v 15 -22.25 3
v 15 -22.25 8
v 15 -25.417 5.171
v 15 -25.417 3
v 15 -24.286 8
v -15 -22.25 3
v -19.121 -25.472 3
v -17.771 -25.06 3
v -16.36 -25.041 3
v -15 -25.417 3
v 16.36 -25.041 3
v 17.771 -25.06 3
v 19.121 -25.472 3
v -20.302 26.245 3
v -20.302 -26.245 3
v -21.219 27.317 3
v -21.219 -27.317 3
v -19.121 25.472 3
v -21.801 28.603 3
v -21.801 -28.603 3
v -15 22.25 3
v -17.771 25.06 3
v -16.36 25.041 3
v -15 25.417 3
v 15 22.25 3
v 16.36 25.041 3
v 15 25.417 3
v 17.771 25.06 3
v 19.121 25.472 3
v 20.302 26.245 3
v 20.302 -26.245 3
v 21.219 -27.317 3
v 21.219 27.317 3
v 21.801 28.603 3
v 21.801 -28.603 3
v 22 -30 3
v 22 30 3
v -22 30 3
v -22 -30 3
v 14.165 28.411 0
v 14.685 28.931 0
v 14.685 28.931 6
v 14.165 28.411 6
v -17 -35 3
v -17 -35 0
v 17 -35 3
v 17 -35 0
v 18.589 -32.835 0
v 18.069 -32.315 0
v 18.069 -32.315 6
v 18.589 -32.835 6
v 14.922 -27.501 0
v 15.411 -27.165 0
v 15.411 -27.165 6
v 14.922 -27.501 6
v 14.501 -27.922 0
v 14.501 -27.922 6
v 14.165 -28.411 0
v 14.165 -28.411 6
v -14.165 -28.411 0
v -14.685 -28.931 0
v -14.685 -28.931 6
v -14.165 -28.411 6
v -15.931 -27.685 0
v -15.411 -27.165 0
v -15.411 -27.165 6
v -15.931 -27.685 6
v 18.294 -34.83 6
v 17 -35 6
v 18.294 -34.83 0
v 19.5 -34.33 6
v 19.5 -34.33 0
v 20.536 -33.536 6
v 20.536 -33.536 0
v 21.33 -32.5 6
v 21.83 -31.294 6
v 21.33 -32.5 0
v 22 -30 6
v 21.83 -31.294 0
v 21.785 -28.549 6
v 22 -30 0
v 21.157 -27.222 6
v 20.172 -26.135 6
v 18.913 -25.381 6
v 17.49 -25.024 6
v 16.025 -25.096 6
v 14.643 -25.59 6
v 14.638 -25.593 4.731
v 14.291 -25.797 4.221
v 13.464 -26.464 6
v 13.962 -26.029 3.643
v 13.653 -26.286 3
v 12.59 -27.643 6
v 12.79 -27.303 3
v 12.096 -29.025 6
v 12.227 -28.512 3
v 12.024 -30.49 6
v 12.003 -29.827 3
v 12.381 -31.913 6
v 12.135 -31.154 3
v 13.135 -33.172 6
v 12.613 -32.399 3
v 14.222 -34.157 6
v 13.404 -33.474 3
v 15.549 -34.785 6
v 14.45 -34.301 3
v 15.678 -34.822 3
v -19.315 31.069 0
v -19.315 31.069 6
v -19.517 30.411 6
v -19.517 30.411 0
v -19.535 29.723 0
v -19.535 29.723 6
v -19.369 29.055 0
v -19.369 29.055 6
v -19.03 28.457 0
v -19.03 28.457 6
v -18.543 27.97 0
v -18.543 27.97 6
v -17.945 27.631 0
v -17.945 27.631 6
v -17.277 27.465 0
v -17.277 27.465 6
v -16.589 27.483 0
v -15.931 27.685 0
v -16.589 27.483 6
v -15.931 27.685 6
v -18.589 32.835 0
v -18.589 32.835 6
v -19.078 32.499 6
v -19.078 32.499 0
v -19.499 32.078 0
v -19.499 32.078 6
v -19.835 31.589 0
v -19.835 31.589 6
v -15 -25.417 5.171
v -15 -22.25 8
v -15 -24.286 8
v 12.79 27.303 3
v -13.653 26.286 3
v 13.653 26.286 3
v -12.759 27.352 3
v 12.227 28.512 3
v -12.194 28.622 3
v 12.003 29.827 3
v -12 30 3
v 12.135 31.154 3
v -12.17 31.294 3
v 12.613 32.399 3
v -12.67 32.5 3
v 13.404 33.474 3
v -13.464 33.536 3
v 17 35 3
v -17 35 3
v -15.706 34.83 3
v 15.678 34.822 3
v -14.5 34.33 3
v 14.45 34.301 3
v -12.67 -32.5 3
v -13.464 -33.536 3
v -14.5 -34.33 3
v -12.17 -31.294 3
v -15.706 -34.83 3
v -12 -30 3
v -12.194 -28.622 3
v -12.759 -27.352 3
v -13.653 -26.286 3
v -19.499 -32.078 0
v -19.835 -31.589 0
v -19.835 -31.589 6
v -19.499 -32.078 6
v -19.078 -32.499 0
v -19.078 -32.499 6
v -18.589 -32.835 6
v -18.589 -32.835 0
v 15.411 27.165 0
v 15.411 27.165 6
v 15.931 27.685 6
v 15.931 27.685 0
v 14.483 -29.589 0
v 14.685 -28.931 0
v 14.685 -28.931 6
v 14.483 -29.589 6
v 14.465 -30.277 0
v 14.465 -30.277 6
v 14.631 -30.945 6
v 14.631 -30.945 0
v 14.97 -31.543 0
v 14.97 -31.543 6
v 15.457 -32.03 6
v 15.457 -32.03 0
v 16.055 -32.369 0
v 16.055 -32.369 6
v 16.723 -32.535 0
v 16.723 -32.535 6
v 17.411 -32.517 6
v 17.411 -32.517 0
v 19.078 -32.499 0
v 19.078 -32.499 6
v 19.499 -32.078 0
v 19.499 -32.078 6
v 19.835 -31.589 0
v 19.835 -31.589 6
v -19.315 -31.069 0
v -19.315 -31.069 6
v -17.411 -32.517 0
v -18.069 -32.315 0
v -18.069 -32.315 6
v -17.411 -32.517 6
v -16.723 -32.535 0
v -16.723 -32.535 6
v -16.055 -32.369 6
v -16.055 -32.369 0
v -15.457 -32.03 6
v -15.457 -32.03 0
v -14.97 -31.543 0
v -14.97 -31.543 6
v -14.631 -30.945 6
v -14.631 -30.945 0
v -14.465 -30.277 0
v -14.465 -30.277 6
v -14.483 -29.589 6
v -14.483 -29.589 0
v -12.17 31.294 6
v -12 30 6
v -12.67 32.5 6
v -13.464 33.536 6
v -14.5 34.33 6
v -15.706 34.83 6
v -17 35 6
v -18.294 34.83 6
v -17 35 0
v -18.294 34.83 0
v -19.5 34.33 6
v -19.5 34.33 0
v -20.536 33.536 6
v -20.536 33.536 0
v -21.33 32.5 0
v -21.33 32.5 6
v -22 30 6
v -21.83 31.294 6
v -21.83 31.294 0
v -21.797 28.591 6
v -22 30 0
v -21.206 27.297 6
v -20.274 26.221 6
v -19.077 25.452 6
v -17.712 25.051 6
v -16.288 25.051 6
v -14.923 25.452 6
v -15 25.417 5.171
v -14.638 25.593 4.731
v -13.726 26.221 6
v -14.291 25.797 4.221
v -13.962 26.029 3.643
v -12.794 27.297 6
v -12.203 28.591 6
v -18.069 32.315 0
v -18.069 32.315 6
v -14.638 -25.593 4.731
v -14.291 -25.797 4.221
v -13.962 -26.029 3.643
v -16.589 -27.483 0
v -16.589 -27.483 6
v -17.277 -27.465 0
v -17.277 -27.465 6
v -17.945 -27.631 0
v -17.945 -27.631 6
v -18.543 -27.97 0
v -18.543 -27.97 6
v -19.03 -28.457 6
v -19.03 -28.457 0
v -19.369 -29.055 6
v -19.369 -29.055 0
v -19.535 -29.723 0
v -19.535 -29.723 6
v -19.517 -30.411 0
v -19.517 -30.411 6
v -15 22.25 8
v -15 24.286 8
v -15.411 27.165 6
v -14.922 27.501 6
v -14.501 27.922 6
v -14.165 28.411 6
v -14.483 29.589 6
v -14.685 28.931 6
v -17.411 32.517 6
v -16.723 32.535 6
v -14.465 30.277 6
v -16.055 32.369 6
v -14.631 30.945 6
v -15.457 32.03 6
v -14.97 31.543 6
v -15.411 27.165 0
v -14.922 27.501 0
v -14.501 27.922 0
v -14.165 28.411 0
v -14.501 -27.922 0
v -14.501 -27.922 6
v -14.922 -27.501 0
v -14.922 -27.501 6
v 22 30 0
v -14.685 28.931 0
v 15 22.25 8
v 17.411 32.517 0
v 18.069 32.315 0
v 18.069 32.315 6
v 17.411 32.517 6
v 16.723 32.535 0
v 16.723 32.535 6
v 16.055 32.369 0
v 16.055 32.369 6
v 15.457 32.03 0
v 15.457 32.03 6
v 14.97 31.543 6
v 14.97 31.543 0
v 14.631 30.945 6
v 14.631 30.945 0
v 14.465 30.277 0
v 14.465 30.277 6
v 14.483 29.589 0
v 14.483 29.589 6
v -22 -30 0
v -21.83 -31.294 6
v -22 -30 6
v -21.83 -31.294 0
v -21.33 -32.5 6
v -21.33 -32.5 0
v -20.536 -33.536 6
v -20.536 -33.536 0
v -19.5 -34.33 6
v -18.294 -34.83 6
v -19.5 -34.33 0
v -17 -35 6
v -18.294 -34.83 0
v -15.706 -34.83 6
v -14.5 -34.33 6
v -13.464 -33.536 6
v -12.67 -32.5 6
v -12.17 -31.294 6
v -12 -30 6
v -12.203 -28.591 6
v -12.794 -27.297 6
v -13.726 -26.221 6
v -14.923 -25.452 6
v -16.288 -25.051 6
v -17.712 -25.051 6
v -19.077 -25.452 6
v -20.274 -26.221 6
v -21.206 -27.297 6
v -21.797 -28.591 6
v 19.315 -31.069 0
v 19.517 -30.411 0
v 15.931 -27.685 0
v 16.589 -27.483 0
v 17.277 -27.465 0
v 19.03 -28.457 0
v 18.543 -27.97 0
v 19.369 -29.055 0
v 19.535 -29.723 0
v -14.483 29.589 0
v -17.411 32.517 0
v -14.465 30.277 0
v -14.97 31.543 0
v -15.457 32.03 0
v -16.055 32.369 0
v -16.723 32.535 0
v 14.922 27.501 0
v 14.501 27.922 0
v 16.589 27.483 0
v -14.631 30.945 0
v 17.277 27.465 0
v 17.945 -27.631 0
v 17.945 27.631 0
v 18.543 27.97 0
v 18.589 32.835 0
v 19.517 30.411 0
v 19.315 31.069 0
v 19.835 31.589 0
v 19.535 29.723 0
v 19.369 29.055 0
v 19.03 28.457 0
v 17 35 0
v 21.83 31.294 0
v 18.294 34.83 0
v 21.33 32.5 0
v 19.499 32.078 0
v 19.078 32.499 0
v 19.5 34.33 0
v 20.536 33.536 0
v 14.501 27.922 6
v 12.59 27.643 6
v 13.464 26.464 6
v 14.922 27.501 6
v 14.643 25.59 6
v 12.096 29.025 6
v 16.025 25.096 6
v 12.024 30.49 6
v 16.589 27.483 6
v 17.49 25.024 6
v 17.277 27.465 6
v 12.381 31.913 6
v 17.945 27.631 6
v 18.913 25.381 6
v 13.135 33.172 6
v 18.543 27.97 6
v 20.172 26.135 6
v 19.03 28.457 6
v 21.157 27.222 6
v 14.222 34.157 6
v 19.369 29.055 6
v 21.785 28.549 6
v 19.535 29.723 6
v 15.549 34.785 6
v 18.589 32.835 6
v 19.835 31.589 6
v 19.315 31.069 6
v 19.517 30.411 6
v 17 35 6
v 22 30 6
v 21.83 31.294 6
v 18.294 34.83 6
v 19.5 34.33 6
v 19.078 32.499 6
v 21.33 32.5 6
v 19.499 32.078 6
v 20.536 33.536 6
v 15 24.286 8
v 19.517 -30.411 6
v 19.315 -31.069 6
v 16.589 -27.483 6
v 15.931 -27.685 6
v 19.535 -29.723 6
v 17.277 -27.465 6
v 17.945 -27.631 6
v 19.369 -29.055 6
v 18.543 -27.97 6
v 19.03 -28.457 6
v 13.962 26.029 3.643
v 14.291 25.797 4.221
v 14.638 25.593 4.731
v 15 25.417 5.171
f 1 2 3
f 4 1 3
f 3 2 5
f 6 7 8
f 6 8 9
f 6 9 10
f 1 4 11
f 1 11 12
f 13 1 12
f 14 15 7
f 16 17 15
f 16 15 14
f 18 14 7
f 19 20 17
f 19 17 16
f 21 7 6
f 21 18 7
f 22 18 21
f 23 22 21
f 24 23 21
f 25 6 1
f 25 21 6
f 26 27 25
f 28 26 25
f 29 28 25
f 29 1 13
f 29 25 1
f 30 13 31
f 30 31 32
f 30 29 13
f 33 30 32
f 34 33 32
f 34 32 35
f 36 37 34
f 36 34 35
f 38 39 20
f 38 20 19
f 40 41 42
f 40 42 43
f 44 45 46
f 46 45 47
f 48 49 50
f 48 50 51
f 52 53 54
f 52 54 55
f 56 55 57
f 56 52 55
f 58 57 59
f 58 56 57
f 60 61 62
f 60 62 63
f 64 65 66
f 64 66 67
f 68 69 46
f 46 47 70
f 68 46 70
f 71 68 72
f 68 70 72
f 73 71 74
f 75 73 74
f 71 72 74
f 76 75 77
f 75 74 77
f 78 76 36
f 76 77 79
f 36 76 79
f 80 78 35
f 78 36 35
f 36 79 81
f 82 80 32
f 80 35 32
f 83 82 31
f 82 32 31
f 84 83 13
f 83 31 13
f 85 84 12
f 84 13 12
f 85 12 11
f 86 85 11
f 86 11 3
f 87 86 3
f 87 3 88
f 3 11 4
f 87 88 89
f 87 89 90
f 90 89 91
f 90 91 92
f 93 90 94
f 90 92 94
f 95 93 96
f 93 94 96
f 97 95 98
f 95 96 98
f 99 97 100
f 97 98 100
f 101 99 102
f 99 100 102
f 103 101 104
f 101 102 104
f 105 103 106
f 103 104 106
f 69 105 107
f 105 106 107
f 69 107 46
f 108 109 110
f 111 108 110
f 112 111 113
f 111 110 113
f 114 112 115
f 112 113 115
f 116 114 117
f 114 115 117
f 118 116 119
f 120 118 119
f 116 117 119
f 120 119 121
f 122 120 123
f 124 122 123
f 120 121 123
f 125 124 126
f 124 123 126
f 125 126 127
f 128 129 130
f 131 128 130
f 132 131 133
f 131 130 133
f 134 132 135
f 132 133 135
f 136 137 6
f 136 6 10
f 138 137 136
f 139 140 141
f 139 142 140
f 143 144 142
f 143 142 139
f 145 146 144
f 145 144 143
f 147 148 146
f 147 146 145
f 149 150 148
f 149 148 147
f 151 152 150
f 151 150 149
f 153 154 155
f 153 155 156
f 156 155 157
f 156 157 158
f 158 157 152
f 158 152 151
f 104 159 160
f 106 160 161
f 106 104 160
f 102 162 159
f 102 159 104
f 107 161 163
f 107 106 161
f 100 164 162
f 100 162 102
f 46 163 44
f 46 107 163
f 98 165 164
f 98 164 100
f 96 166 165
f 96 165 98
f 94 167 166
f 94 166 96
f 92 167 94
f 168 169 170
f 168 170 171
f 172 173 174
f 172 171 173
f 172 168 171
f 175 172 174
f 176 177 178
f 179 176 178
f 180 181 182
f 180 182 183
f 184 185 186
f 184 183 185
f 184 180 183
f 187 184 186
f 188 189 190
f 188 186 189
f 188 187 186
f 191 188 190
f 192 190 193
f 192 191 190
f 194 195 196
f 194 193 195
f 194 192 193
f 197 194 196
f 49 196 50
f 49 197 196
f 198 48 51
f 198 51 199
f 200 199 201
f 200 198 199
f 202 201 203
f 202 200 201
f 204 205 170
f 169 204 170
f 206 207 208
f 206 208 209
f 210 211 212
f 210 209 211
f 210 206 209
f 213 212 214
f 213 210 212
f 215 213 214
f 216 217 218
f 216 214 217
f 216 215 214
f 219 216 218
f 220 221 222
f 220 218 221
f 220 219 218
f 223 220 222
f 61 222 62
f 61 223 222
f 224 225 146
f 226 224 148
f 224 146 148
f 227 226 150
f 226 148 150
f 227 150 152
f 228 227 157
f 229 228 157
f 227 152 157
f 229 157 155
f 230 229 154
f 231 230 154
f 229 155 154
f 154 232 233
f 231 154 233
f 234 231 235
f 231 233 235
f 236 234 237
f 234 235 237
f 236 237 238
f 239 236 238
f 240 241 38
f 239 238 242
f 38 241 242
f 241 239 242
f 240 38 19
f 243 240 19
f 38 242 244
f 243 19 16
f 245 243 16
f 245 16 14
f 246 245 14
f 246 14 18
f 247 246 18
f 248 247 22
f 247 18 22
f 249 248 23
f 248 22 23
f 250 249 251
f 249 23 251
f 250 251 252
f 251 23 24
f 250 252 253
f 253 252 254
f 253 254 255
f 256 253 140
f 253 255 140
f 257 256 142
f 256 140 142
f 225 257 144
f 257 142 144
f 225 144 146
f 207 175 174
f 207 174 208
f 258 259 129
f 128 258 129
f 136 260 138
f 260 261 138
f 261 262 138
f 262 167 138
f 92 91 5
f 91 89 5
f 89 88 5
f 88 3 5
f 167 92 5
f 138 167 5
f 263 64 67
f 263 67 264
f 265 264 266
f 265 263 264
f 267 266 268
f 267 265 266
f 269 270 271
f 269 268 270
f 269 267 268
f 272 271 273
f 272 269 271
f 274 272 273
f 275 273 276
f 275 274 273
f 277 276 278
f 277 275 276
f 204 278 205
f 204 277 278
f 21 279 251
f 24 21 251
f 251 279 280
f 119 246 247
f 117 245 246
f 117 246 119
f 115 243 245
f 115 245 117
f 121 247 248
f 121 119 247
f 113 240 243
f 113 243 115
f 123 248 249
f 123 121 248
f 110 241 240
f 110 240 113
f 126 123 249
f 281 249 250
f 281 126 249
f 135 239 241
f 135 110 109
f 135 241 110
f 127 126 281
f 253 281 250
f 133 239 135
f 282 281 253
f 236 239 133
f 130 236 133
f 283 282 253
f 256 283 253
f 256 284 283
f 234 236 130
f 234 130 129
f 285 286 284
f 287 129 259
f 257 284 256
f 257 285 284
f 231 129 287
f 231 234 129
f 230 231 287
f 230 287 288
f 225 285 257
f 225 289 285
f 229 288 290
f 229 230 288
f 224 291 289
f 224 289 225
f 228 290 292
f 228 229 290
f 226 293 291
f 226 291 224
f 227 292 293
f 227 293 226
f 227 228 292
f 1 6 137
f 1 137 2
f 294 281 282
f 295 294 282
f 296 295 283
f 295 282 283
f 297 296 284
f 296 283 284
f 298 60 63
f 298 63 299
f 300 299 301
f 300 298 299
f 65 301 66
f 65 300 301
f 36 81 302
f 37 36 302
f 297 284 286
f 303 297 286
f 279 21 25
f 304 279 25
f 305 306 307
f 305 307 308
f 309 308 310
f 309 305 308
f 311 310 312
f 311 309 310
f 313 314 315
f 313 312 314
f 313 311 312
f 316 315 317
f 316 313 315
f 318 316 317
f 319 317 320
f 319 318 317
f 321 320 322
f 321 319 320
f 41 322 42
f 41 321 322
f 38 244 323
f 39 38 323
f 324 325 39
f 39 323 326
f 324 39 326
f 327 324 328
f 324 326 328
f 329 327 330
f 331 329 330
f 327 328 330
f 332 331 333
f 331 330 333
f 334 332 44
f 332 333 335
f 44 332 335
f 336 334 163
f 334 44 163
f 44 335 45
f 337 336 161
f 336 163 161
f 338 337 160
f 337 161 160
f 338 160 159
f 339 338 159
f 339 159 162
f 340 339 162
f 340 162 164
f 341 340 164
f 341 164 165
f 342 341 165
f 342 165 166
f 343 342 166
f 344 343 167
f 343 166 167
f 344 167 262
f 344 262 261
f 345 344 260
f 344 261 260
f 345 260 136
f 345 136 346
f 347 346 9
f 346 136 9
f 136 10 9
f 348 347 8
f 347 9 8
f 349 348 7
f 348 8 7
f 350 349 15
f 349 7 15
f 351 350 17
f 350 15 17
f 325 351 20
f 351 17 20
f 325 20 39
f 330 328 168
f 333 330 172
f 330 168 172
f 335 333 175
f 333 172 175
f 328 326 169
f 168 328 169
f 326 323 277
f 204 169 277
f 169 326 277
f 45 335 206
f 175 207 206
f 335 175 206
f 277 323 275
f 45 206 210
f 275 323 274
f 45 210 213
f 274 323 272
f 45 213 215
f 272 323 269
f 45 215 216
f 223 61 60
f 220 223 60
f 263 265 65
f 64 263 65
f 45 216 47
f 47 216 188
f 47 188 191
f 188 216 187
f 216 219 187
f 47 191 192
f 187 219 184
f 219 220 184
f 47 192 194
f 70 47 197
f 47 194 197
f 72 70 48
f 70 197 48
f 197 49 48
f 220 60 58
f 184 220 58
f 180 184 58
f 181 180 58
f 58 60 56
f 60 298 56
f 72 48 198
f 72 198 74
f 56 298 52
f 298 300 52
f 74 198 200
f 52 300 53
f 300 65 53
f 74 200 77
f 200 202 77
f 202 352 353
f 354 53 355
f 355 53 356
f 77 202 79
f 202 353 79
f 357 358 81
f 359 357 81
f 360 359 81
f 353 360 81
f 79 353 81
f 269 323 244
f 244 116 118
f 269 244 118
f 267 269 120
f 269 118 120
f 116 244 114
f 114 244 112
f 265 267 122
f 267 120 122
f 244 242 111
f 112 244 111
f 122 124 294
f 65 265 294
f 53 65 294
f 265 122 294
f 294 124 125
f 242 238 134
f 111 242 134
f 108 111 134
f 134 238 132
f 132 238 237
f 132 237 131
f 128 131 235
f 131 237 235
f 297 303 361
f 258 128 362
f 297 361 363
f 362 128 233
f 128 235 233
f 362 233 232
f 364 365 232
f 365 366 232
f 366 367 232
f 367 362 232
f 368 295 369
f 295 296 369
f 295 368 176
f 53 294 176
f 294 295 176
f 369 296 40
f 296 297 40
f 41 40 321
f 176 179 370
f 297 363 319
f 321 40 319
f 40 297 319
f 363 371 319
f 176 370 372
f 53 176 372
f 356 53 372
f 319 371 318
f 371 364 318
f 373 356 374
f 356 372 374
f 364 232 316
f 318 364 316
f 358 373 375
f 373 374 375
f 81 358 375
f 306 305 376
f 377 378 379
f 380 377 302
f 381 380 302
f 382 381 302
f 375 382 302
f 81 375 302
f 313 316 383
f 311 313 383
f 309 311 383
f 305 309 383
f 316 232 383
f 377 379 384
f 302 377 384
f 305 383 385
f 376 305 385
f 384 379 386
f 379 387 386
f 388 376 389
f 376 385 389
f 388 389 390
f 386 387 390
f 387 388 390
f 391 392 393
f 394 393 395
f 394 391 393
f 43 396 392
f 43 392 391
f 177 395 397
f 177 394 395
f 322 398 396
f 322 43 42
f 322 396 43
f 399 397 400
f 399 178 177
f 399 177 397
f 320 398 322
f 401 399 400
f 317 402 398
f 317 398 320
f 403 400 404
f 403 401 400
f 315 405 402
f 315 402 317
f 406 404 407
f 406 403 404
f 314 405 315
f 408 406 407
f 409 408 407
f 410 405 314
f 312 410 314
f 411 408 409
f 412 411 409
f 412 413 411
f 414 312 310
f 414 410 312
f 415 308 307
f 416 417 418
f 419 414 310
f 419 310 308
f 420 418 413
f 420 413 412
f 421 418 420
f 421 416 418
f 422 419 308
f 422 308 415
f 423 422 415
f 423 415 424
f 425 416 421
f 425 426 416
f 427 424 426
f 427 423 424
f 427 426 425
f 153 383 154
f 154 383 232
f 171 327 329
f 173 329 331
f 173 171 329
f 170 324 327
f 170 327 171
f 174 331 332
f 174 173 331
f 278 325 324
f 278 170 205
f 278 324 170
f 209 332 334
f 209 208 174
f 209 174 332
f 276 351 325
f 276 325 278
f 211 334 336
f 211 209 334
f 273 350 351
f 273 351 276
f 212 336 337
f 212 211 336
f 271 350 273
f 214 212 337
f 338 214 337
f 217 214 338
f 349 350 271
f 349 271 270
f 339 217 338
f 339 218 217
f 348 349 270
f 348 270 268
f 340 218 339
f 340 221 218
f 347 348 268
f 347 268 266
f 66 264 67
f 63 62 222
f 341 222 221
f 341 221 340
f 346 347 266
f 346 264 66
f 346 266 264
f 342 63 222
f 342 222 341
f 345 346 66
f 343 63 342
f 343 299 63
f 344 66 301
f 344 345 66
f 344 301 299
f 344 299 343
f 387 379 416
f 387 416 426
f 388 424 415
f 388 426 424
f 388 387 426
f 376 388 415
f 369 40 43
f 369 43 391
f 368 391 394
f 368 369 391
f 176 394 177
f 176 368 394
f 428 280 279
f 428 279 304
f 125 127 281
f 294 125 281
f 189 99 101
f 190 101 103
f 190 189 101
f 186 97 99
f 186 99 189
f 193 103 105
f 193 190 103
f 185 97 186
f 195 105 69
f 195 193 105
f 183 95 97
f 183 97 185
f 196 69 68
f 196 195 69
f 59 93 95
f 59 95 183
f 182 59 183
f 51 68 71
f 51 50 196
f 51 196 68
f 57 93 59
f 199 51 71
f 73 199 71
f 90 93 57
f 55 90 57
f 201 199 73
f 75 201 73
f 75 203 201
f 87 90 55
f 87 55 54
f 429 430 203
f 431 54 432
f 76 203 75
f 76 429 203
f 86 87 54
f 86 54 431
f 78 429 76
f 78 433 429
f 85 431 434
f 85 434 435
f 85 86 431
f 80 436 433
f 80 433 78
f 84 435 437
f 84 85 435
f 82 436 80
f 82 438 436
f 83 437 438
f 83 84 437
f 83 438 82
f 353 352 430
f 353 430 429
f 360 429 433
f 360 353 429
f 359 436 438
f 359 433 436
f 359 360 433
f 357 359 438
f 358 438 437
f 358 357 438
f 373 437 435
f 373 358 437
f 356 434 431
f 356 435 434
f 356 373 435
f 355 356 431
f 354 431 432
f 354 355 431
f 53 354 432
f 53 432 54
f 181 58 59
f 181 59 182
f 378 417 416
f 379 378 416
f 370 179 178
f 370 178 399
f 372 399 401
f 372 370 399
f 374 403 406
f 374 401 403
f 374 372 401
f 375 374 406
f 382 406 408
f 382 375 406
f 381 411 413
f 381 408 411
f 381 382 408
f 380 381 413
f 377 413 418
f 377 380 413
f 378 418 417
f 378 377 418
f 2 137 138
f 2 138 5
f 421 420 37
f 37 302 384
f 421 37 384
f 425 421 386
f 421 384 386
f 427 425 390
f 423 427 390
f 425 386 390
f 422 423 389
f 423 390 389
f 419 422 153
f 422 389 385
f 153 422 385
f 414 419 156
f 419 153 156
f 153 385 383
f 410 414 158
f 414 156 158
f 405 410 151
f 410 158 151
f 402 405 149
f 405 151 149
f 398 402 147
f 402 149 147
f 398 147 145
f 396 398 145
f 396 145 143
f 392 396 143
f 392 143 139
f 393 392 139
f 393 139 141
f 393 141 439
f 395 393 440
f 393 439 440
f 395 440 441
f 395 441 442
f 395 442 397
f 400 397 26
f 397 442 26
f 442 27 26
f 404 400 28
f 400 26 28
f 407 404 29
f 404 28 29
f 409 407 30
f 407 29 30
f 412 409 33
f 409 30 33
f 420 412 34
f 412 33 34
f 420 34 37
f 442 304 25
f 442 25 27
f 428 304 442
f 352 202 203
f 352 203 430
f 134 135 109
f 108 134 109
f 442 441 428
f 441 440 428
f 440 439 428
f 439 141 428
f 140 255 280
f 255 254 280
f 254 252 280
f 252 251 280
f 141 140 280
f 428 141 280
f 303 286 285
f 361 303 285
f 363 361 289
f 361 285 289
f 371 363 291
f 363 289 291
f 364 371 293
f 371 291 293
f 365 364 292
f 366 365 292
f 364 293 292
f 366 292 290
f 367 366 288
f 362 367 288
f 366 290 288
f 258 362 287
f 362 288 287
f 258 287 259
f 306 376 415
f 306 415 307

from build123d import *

# Parameters (mm, degrees)
F1_DEPTH    = 3
F3_DEPTH    = 6
F5_DEPTH    = 12.5
F6_W        = 30
F6_H        = 2.0356480181
F7_DEPTH    = 8
F8_T4_DEPTH = 30
F8_T9_DEPTH = 30


# Not quite as in the source:
# - a fillet or chamfer that OpenCascade refuses, or shapes differently, is made with other operations: its cross-section is extruded or revolved along the edge and cut away or added


with BuildPart() as f1:
    # F0 (on Top) → F1 (new body)
    with BuildSketch(Plane.XY):
        with BuildLine():
            ThreePointArc((22, 30), (20.5355339059, 33.5355339059), (17, 35))
            Line((17, 35), (-17, 35))
            ThreePointArc((-17, 35), (-20.5355339059, 33.5355339059), (-22, 30))
            Line((-22, 30), (-22, -30))
            ThreePointArc((-22, -30), (-20.5355339059, -33.5355339059), (-17, -35))
            Line((-17, -35), (17, -35))
            ThreePointArc((17, -35), (20.5355339059, -33.5355339059), (22, -30))
            Line((22, -30), (22, 30))
        make_face()
    extrude(amount=F1_DEPTH)

    # F2 (on Top) → F3 (join)
    with BuildSketch(Plane.XY):
        with BuildLine():
            ThreePointArc((-12, 30), (-13.4644661049, 33.5355339167), (-17.0000000305, 35))
            ThreePointArc((-17.0000000305, 35), (-20.5355339275, 33.5355338843), (-22, 29.9999999695))
            ThreePointArc((-22, 29.9999999695), (-16.9999999847, 25), (-12, 30))
        make_face()
        with BuildLine():
            ThreePointArc((22, 30), (20.5355339059, 33.5355339059), (17, 35))
            ThreePointArc((17, 35), (13.4644660941, 26.4644660941), (22, 30))
        make_face()
        with BuildLine():
            ThreePointArc((17, -35), (20.5355339059, -33.5355339059), (22, -30))
            ThreePointArc((22, -30), (13.4644660941, -26.4644660941), (17, -35))
        make_face()
        with BuildLine():
            ThreePointArc((-12, -30), (-17, -25), (-22, -30))
            ThreePointArc((-22, -30), (-20.5355339059, -33.5355339059), (-17, -35))
            ThreePointArc((-17, -35), (-13.4644660941, -33.5355339059), (-12, -30))
        make_face()
    extrude(amount=F3_DEPTH)

    # F4 (on Top) → F5 (cut, symmetric)
    with BuildSketch(Plane.XY):
        with BuildLine():
            ThreePointArc((-18.0685374254, -32.3153245497), (-15.6256402281, -32.1479374333), (-14.45, -30))
            ThreePointArc((-14.45, -30), (-14.5093597608, -29.4529979899), (-14.6846754503, -28.9314625746))
            Line((-14.6846754503, -28.9314625746), (-18.0685374254, -32.3153245497))
        make_face()
        with BuildLine():
            Line((-18.0685374254, -32.3153245497), (-14.6846754503, -28.9314625746))
            ThreePointArc((-14.6846754503, -28.9314625746), (-15.196877708, -28.196877708), (-15.9314625746, -27.6846754503))
            Line((-15.9314625746, -27.6846754503), (-19.3153245497, -31.0685374254))
            ThreePointArc((-19.3153245497, -31.0685374254), (-18.803122292, -31.803122292), (-18.0685374254, -32.3153245497))
        make_face()
        with BuildLine():
            ThreePointArc((-15.9314625746, -27.6846754503), (-15.196877708, -28.196877708), (-14.6846754503, -28.9314625746))
            Line((-14.6846754503, -28.9314625746), (-14.16467731, -28.4114644343))
            ThreePointArc((-14.16467731, -28.4114644343), (-14.7019029611, -27.7019029611), (-15.4114644343, -27.16467731))
            Line((-15.4114644343, -27.16467731), (-15.9314625746, -27.6846754503))
        make_face()
        with BuildLine():
            Line((-18.5885355657, -32.83532269), (-18.0685374254, -32.3153245497))
            ThreePointArc((-18.0685374254, -32.3153245497), (-18.803122292, -31.803122292), (-19.3153245497, -31.0685374254))
            Line((-19.3153245497, -31.0685374254), (-19.83532269, -31.5885355657))
            ThreePointArc((-19.83532269, -31.5885355657), (-19.2980970389, -32.2980970389), (-18.5885355657, -32.83532269))
        make_face()
        with BuildLine():
            Line((-19.3153245497, -31.0685374254), (-15.9314625746, -27.6846754503))
            ThreePointArc((-15.9314625746, -27.6846754503), (-18.803122292, -28.196877708), (-19.3153245497, -31.0685374254))
        make_face()
        with BuildLine():
            ThreePointArc((19.3153245497, -31.0685374254), (19.4906402392, -30.5470020101), (19.55, -30))
            ThreePointArc((19.55, -30), (18.3743597719, -27.8520625667), (15.9314625746, -27.6846754503))
            Line((15.9314625746, -27.6846754503), (19.3153245497, -31.0685374254))
        make_face()
        with BuildLine():
            Line((19.3153245497, -31.0685374254), (15.9314625746, -27.6846754503))
            ThreePointArc((15.9314625746, -27.6846754503), (15.196877708, -28.196877708), (14.6846754503, -28.9314625746))
            Line((14.6846754503, -28.9314625746), (18.0685374254, -32.3153245497))
            ThreePointArc((18.0685374254, -32.3153245497), (18.803122292, -31.803122292), (19.3153245497, -31.0685374254))
        make_face()
        with BuildLine():
            ThreePointArc((14.6846754503, -28.9314625746), (15.196877708, -28.196877708), (15.9314625746, -27.6846754503))
            Line((15.9314625746, -27.6846754503), (15.4114644343, -27.16467731))
            ThreePointArc((15.4114644343, -27.16467731), (14.7019029611, -27.7019029611), (14.16467731, -28.4114644343))
            Line((14.16467731, -28.4114644343), (14.6846754503, -28.9314625746))
        make_face()
        with BuildLine():
            Line((19.83532269, -31.5885355657), (19.3153245497, -31.0685374254))
            ThreePointArc((19.3153245497, -31.0685374254), (18.803122292, -31.803122292), (18.0685374254, -32.3153245497))
            Line((18.0685374254, -32.3153245497), (18.5885355657, -32.83532269))
            ThreePointArc((18.5885355657, -32.83532269), (19.2980970389, -32.2980970389), (19.83532269, -31.5885355657))
        make_face()
        with BuildLine():
            Line((18.0685374254, -32.3153245497), (14.6846754503, -28.9314625746))
            ThreePointArc((14.6846754503, -28.9314625746), (15.196877708, -31.803122292), (18.0685374254, -32.3153245497))
        make_face()
        with BuildLine():
            ThreePointArc((15.9314625746, 27.6846754503), (18.3743597719, 27.8520625667), (19.55, 30))
            ThreePointArc((19.55, 30), (19.4906402392, 30.5470020101), (19.3153245497, 31.0685374254))
            Line((19.3153245497, 31.0685374254), (15.9314625746, 27.6846754503))
        make_face()
        with BuildLine():
            Line((15.9314625746, 27.6846754503), (19.3153245497, 31.0685374254))
            ThreePointArc((19.3153245497, 31.0685374254), (18.803122292, 31.803122292), (18.0685374254, 32.3153245497))
            Line((18.0685374254, 32.3153245497), (14.6846754503, 28.9314625746))
            ThreePointArc((14.6846754503, 28.9314625746), (15.196877708, 28.196877708), (15.9314625746, 27.6846754503))
        make_face()
        with BuildLine():
            ThreePointArc((18.0685374254, 32.3153245497), (18.803122292, 31.803122292), (19.3153245497, 31.0685374254))
            Line((19.3153245497, 31.0685374254), (19.83532269, 31.5885355657))
            ThreePointArc((19.83532269, 31.5885355657), (19.2980970389, 32.2980970389), (18.5885355657, 32.83532269))
            Line((18.5885355657, 32.83532269), (18.0685374254, 32.3153245497))
        make_face()
        with BuildLine():
            Line((15.4114644343, 27.16467731), (15.9314625746, 27.6846754503))
            ThreePointArc((15.9314625746, 27.6846754503), (15.196877708, 28.196877708), (14.6846754503, 28.9314625746))
            Line((14.6846754503, 28.9314625746), (14.16467731, 28.4114644343))
            ThreePointArc((14.16467731, 28.4114644343), (14.7019029611, 27.7019029611), (15.4114644343, 27.16467731))
        make_face()
        with BuildLine():
            Line((14.6846754503, 28.9314625746), (18.0685374254, 32.3153245497))
            ThreePointArc((18.0685374254, 32.3153245497), (15.196877708, 31.803122292), (14.6846754503, 28.9314625746))
        make_face()
        with BuildLine():
            ThreePointArc((-14.6846754503, 28.9314625746), (-14.5093597608, 29.4529979899), (-14.45, 30))
            ThreePointArc((-14.45, 30), (-15.6256402281, 32.1479374333), (-18.0685374254, 32.3153245497))
            Line((-18.0685374254, 32.3153245497), (-14.6846754503, 28.9314625746))
        make_face()
        with BuildLine():
            Line((-14.6846754503, 28.9314625746), (-18.0685374254, 32.3153245497))
            ThreePointArc((-18.0685374254, 32.3153245497), (-18.803122292, 31.803122292), (-19.3153245497, 31.0685374254))
            Line((-19.3153245497, 31.0685374254), (-15.9314625746, 27.6846754503))
            ThreePointArc((-15.9314625746, 27.6846754503), (-15.196877708, 28.196877708), (-14.6846754503, 28.9314625746))
        make_face()
        with BuildLine():
            ThreePointArc((-19.3153245497, 31.0685374254), (-18.803122292, 31.803122292), (-18.0685374254, 32.3153245497))
            Line((-18.0685374254, 32.3153245497), (-18.5885355657, 32.83532269))
            ThreePointArc((-18.5885355657, 32.83532269), (-19.2980970389, 32.2980970389), (-19.83532269, 31.5885355657))
            Line((-19.83532269, 31.5885355657), (-19.3153245497, 31.0685374254))
        make_face()
        with BuildLine():
            Line((-14.16467731, 28.4114644343), (-14.6846754503, 28.9314625746))
            ThreePointArc((-14.6846754503, 28.9314625746), (-15.196877708, 28.196877708), (-15.9314625746, 27.6846754503))
            Line((-15.9314625746, 27.6846754503), (-15.4114644343, 27.16467731))
            ThreePointArc((-15.4114644343, 27.16467731), (-14.7019029611, 27.7019029611), (-14.16467731, 28.4114644343))
        make_face()
        with BuildLine():
            Line((-15.9314625746, 27.6846754503), (-19.3153245497, 31.0685374254))
            ThreePointArc((-19.3153245497, 31.0685374254), (-18.803122292, 28.196877708), (-15.9314625746, 27.6846754503))
        make_face()
    extrude(amount=F5_DEPTH, both=True, mode=Mode.SUBTRACT)

    # F6 (on Top) → F7 (join)
    with BuildSketch(Plane.XY):
        with Locations((0, 23.2678240091)):
            Rectangle(F6_W, F6_H)
        with Locations((0, -23.2678240091)):
            Rectangle(F6_W, F6_H)
    extrude(amount=F7_DEPTH)

    # F8: chamfer of 5 x 2 on 2 edges, made by hand


with BuildPart() as f8_tool2:
    # F8_s3 → F8_t4 (new body)
    with BuildSketch(Plane.YZ.offset(-15)):
        Polygon((26.2856480181, 3), (24.2856480181, 8), (24.2856480181, 3), align=None)
    extrude(amount=F8_T4_DEPTH)

    split(bisect_by=Plane.XY.offset(8), keep=Keep.BOTTOM)


with BuildPart() as f1_1:
    add(f1.part)

    # F8_t1: union F8_tool2
    add(f8_tool2.part)


with BuildPart() as f8_tool7:
    # F8_s8 → F8_t9 (new body)
    with BuildSketch(Plane.YZ.offset(15)):
        Polygon((-26.2856480181, 3), (-24.2856480181, 8), (-24.2856480181, 3), align=None)
    extrude(amount=-F8_T9_DEPTH)

    split(bisect_by=Plane.XY.offset(8), keep=Keep.BOTTOM)


with BuildPart() as f1_2:
    add(f1_1.part)

    # F8_t6: union F8_tool7
    add(f8_tool7.part)


solid = f1_2.part
